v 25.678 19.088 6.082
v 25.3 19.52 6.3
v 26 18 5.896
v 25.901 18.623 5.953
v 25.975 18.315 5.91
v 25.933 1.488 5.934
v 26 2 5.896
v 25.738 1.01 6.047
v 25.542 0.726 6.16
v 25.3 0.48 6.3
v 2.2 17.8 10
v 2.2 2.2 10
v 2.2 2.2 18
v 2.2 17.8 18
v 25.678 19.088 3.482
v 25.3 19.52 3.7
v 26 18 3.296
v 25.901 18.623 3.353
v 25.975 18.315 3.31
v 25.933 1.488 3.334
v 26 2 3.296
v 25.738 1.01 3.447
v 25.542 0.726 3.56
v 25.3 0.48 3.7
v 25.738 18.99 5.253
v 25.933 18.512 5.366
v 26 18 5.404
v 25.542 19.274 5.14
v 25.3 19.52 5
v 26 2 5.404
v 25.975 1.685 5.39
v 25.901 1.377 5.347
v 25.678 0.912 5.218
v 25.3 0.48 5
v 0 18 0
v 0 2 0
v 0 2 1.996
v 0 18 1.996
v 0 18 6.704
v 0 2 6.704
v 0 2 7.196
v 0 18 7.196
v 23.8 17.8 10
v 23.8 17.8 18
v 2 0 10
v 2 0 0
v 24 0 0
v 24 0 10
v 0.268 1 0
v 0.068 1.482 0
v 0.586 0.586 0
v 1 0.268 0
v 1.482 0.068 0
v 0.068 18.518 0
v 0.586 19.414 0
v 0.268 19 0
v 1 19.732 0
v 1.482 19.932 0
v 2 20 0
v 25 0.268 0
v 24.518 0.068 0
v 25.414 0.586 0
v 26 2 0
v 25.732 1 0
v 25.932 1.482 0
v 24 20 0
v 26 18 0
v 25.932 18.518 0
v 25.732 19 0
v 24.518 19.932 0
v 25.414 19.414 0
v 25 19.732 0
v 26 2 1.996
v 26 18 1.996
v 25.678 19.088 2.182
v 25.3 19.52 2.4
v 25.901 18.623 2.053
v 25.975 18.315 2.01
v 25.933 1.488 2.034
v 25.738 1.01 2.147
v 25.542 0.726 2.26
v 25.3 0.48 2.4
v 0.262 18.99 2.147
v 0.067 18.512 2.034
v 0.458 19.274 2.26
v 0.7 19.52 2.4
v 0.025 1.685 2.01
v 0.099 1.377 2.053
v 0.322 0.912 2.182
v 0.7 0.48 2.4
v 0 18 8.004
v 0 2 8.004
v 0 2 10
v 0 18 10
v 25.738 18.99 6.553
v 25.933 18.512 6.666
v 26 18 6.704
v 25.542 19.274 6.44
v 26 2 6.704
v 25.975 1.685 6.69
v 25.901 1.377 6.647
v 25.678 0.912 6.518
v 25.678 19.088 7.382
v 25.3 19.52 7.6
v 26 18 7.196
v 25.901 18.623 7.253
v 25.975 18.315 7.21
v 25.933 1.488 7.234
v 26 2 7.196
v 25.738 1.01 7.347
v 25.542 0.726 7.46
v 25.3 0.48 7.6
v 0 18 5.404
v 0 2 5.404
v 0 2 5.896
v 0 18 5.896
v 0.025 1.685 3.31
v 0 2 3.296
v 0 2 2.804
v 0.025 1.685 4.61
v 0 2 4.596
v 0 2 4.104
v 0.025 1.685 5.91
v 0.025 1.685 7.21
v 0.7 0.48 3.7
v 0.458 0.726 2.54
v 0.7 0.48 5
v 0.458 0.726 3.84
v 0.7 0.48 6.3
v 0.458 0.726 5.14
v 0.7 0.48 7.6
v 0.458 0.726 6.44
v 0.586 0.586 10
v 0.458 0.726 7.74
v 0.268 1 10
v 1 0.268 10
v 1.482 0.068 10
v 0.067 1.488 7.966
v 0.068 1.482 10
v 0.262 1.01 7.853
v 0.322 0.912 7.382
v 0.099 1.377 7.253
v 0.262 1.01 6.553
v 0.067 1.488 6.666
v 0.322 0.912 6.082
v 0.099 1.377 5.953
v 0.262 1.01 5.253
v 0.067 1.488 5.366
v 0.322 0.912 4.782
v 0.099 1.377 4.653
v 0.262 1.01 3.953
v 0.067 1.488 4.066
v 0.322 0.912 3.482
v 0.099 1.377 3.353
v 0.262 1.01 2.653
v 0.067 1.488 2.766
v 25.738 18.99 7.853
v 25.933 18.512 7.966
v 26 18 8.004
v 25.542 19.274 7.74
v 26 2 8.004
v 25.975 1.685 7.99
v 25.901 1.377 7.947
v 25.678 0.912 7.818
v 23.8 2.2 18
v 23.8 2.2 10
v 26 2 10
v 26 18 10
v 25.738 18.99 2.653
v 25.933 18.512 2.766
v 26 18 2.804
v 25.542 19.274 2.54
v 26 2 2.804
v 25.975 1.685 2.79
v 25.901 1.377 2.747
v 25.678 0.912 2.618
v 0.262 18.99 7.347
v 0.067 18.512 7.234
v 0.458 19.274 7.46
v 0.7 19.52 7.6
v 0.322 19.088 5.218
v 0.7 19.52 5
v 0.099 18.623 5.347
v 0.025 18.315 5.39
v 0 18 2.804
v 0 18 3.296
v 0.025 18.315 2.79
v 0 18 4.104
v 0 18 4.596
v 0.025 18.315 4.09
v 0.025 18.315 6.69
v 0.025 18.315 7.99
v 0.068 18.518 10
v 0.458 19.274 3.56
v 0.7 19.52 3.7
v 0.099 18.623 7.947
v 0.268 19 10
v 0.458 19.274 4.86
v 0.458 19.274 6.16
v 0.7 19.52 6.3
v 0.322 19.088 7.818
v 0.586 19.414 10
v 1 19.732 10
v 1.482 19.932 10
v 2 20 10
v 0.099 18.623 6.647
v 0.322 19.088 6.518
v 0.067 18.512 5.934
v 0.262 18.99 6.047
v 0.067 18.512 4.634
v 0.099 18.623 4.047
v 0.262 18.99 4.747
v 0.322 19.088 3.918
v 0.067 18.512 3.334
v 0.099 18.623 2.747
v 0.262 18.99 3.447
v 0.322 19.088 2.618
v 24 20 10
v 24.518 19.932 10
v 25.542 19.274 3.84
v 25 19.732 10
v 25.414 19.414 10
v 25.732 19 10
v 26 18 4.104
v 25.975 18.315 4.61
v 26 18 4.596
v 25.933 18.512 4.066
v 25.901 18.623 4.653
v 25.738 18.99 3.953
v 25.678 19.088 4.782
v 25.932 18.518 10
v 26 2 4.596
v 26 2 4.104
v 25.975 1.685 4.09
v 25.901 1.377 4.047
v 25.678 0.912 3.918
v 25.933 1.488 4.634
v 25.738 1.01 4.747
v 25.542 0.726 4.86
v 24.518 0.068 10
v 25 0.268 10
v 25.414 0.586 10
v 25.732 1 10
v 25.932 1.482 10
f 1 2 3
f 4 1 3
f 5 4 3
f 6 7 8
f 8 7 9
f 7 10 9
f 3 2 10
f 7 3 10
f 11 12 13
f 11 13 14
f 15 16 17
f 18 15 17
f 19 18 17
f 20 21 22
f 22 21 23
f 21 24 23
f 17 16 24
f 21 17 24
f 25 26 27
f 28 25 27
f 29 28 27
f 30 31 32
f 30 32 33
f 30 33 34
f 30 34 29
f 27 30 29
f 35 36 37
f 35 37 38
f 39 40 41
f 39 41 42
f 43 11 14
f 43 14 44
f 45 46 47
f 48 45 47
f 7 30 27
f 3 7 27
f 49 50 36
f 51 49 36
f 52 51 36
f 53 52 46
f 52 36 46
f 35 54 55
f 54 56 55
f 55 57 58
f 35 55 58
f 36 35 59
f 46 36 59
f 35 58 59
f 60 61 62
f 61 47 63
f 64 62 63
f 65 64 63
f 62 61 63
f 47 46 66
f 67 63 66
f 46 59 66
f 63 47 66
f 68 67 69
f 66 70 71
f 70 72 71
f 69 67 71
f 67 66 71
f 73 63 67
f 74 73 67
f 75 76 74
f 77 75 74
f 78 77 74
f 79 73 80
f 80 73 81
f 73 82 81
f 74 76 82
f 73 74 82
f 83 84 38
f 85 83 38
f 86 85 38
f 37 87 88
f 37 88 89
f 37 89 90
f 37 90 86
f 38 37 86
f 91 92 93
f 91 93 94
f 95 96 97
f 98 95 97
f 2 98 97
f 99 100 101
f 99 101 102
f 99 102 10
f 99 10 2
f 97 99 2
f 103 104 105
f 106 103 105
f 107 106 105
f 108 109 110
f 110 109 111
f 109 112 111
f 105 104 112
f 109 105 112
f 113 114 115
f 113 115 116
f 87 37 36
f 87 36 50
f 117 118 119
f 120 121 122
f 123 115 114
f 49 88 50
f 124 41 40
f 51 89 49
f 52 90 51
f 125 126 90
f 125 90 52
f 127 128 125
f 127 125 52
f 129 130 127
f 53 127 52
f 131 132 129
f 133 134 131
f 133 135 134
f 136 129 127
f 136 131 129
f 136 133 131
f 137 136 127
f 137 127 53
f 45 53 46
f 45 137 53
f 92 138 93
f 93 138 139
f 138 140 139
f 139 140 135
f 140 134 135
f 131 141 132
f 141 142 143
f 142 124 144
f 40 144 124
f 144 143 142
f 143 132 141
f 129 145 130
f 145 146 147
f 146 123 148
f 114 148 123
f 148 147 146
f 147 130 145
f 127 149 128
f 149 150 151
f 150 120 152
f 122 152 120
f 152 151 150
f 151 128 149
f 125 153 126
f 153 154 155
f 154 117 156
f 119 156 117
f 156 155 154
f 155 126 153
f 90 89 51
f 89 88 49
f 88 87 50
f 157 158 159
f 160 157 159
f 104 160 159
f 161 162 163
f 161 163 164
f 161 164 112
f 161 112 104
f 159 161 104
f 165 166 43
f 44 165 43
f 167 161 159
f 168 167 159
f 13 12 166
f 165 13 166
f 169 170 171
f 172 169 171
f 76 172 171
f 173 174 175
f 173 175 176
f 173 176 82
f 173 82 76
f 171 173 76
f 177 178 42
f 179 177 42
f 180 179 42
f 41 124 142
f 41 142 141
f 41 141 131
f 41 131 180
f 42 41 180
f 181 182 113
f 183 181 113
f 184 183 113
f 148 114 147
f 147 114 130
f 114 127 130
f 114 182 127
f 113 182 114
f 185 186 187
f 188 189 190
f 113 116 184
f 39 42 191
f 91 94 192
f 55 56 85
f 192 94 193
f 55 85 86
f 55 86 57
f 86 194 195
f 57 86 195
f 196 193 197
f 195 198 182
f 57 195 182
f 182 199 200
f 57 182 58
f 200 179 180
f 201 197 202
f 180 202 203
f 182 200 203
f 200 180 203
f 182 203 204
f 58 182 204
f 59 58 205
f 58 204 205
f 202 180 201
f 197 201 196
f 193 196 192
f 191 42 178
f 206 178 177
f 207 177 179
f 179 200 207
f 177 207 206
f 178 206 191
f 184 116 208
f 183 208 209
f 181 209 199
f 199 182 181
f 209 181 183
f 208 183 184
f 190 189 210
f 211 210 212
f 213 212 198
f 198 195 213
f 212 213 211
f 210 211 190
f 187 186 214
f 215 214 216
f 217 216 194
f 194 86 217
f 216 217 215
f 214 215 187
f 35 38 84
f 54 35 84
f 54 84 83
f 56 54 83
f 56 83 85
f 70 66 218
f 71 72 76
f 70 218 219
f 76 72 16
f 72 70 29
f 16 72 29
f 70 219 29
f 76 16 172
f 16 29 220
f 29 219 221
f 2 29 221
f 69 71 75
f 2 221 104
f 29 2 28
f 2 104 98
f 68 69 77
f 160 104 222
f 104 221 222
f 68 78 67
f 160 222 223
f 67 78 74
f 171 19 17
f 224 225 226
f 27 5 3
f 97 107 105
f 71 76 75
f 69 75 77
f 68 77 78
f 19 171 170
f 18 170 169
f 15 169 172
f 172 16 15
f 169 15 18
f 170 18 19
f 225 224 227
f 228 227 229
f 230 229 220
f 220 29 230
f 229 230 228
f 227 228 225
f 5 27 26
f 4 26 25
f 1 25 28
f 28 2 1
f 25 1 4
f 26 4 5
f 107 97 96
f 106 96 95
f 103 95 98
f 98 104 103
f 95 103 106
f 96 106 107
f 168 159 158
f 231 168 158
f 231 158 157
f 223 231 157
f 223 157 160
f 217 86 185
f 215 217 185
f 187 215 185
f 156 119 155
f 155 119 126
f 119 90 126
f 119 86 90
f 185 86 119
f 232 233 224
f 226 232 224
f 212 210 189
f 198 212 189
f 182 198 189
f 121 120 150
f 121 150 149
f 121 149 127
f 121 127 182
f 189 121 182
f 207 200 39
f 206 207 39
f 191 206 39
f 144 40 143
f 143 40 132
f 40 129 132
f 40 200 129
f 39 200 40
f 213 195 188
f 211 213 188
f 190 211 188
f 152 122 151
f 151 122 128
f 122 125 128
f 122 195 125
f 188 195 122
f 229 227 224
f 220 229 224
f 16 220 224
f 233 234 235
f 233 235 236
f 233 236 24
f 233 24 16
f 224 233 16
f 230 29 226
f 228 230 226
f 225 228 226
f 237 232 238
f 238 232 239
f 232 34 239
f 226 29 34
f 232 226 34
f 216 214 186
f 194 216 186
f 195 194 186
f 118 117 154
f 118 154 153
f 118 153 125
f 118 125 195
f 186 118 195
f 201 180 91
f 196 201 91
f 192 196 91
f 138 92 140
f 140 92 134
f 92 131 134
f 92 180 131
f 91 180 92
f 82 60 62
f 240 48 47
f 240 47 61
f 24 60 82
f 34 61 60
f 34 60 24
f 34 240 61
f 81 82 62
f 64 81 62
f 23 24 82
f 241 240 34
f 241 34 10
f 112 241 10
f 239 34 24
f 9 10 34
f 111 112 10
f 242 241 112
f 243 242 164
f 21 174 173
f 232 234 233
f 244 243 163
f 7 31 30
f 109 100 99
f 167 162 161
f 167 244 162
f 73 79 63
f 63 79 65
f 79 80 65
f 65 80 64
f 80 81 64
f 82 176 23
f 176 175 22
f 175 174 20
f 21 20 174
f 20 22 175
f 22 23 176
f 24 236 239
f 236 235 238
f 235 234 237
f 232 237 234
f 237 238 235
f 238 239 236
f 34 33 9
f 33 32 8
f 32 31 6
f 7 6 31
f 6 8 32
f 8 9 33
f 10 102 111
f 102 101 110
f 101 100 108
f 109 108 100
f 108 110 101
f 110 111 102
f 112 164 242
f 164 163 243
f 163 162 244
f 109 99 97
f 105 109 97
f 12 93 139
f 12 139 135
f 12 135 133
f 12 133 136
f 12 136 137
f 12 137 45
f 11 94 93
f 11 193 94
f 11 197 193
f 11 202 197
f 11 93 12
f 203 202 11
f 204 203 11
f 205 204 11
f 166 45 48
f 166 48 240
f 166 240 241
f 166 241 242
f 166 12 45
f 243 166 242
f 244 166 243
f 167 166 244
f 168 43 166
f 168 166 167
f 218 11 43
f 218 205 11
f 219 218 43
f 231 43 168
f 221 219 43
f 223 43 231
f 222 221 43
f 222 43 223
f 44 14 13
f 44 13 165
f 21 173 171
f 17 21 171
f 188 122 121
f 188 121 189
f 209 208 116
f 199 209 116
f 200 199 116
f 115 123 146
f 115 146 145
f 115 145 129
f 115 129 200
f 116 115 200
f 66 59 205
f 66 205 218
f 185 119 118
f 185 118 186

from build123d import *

# Parameters (mm, degrees)
F0_W     = 26
F0_H     = 20
F0_W_2   = 21.6
F0_H_2   = 15.6
F1_DEPTH = 10
F2_DEPTH = 18
F3_R     = 2
F5_DEPTH = 20


with BuildPart() as f1:
    # F0 (on Top) → F1 (new body)
    with BuildSketch(Plane.XY):
        with Locations((13, 10)):
            Rectangle(F0_W, F0_H)
        with Locations((13, 10)):
            Rectangle(F0_W_2, F0_H_2, mode=Mode.SUBTRACT)
    extrude(amount=F1_DEPTH)

    # F0 (on Top) → F2 (join)
    with BuildSketch(Plane.XY):
        with Locations((13, 10)):
            Rectangle(F0_W_2, F0_H_2)
    extrude(amount=F2_DEPTH)

    # F3
    f3_edges = [f1.edges().sort_by_distance(p)[0] for p in [
        (26, 0, 5),
        (26, 20, 5),
        (0, 20, 5),
        (0, 0, 5),
    ]]
    fillet(f3_edges, radius=F3_R)

    # F4 (on face) → F5 (cut, through all)
    with BuildSketch(Plane.XZ):
        Polygon((26, 1.9958548116), (26, 2.8041451884), (25.3, 2.4), align=None)
        Polygon((26, 3.2958548116), (26, 4.1041451884), (25.3, 3.7), align=None)
        Polygon((26.35, 3.0062177826), (26, 2.8041451884), (26, 1.9958548116), (26.35, 1.7937822174), align=None)
        Polygon((26.35, 4.3062177826), (26, 4.1041451884), (26, 3.2958548116), (26.35, 3.0937822174), align=None)
        Polygon((26.35, 5.6062177826), (26, 5.4041451884), (26, 4.5958548116), (26.35, 4.3937822174), align=None)
        Polygon((26, 4.5958548116), (26, 5.4041451884), (25.3, 5), align=None)
        Polygon((26.35, 6.9062177826), (26, 6.7041451884), (26, 5.8958548116), (26.35, 5.6937822174), align=None)
        Polygon((26, 5.8958548116), (26, 6.7041451884), (25.3, 6.3), align=None)
        Polygon((26, 7.1958548116), (26, 8.0041451884), (25.3, 7.6), align=None)
        Polygon((26.35, 8.2062177826), (26, 8.0041451884), (26, 7.1958548116), (26.35, 6.9937822174), align=None)
        Polygon((0, 8.0041451884), (0, 7.1958548116), (0.7, 7.6), align=None)
        Polygon((0, 6.7041451884), (0, 5.8958548116), (0.7, 6.3), align=None)
        Polygon((0, 5.4041451884), (0, 4.5958548116), (0.7, 5), align=None)
        Polygon((0, 4.1041451884), (0, 3.2958548116), (0.7, 3.7), align=None)
        Polygon((-0.35, 6.9937822174), (0, 7.1958548116), (0, 8.0041451884), (-0.35, 8.2062177826), align=None)
        Polygon((-0.35, 5.6937822174), (0, 5.8958548116), (0, 6.7041451884), (-0.35, 6.9062177826), align=None)
        Polygon((0, 2.8041451884), (0, 1.9958548116), (0.7, 2.4), align=None)
        Polygon((-0.35, 4.3937822174), (0, 4.5958548116), (0, 5.4041451884), (-0.35, 5.6062177826), align=None)
        Polygon((-0.35, 3.0937822174), (0, 3.2958548116), (0, 4.1041451884), (-0.35, 4.3062177826), align=None)
        Polygon((-0.35, 1.7937822174), (0, 1.9958548116), (0, 2.8041451884), (-0.35, 3.0062177826), align=None)
    extrude(amount=-F5_DEPTH, mode=Mode.SUBTRACT)


solid = f1.part
